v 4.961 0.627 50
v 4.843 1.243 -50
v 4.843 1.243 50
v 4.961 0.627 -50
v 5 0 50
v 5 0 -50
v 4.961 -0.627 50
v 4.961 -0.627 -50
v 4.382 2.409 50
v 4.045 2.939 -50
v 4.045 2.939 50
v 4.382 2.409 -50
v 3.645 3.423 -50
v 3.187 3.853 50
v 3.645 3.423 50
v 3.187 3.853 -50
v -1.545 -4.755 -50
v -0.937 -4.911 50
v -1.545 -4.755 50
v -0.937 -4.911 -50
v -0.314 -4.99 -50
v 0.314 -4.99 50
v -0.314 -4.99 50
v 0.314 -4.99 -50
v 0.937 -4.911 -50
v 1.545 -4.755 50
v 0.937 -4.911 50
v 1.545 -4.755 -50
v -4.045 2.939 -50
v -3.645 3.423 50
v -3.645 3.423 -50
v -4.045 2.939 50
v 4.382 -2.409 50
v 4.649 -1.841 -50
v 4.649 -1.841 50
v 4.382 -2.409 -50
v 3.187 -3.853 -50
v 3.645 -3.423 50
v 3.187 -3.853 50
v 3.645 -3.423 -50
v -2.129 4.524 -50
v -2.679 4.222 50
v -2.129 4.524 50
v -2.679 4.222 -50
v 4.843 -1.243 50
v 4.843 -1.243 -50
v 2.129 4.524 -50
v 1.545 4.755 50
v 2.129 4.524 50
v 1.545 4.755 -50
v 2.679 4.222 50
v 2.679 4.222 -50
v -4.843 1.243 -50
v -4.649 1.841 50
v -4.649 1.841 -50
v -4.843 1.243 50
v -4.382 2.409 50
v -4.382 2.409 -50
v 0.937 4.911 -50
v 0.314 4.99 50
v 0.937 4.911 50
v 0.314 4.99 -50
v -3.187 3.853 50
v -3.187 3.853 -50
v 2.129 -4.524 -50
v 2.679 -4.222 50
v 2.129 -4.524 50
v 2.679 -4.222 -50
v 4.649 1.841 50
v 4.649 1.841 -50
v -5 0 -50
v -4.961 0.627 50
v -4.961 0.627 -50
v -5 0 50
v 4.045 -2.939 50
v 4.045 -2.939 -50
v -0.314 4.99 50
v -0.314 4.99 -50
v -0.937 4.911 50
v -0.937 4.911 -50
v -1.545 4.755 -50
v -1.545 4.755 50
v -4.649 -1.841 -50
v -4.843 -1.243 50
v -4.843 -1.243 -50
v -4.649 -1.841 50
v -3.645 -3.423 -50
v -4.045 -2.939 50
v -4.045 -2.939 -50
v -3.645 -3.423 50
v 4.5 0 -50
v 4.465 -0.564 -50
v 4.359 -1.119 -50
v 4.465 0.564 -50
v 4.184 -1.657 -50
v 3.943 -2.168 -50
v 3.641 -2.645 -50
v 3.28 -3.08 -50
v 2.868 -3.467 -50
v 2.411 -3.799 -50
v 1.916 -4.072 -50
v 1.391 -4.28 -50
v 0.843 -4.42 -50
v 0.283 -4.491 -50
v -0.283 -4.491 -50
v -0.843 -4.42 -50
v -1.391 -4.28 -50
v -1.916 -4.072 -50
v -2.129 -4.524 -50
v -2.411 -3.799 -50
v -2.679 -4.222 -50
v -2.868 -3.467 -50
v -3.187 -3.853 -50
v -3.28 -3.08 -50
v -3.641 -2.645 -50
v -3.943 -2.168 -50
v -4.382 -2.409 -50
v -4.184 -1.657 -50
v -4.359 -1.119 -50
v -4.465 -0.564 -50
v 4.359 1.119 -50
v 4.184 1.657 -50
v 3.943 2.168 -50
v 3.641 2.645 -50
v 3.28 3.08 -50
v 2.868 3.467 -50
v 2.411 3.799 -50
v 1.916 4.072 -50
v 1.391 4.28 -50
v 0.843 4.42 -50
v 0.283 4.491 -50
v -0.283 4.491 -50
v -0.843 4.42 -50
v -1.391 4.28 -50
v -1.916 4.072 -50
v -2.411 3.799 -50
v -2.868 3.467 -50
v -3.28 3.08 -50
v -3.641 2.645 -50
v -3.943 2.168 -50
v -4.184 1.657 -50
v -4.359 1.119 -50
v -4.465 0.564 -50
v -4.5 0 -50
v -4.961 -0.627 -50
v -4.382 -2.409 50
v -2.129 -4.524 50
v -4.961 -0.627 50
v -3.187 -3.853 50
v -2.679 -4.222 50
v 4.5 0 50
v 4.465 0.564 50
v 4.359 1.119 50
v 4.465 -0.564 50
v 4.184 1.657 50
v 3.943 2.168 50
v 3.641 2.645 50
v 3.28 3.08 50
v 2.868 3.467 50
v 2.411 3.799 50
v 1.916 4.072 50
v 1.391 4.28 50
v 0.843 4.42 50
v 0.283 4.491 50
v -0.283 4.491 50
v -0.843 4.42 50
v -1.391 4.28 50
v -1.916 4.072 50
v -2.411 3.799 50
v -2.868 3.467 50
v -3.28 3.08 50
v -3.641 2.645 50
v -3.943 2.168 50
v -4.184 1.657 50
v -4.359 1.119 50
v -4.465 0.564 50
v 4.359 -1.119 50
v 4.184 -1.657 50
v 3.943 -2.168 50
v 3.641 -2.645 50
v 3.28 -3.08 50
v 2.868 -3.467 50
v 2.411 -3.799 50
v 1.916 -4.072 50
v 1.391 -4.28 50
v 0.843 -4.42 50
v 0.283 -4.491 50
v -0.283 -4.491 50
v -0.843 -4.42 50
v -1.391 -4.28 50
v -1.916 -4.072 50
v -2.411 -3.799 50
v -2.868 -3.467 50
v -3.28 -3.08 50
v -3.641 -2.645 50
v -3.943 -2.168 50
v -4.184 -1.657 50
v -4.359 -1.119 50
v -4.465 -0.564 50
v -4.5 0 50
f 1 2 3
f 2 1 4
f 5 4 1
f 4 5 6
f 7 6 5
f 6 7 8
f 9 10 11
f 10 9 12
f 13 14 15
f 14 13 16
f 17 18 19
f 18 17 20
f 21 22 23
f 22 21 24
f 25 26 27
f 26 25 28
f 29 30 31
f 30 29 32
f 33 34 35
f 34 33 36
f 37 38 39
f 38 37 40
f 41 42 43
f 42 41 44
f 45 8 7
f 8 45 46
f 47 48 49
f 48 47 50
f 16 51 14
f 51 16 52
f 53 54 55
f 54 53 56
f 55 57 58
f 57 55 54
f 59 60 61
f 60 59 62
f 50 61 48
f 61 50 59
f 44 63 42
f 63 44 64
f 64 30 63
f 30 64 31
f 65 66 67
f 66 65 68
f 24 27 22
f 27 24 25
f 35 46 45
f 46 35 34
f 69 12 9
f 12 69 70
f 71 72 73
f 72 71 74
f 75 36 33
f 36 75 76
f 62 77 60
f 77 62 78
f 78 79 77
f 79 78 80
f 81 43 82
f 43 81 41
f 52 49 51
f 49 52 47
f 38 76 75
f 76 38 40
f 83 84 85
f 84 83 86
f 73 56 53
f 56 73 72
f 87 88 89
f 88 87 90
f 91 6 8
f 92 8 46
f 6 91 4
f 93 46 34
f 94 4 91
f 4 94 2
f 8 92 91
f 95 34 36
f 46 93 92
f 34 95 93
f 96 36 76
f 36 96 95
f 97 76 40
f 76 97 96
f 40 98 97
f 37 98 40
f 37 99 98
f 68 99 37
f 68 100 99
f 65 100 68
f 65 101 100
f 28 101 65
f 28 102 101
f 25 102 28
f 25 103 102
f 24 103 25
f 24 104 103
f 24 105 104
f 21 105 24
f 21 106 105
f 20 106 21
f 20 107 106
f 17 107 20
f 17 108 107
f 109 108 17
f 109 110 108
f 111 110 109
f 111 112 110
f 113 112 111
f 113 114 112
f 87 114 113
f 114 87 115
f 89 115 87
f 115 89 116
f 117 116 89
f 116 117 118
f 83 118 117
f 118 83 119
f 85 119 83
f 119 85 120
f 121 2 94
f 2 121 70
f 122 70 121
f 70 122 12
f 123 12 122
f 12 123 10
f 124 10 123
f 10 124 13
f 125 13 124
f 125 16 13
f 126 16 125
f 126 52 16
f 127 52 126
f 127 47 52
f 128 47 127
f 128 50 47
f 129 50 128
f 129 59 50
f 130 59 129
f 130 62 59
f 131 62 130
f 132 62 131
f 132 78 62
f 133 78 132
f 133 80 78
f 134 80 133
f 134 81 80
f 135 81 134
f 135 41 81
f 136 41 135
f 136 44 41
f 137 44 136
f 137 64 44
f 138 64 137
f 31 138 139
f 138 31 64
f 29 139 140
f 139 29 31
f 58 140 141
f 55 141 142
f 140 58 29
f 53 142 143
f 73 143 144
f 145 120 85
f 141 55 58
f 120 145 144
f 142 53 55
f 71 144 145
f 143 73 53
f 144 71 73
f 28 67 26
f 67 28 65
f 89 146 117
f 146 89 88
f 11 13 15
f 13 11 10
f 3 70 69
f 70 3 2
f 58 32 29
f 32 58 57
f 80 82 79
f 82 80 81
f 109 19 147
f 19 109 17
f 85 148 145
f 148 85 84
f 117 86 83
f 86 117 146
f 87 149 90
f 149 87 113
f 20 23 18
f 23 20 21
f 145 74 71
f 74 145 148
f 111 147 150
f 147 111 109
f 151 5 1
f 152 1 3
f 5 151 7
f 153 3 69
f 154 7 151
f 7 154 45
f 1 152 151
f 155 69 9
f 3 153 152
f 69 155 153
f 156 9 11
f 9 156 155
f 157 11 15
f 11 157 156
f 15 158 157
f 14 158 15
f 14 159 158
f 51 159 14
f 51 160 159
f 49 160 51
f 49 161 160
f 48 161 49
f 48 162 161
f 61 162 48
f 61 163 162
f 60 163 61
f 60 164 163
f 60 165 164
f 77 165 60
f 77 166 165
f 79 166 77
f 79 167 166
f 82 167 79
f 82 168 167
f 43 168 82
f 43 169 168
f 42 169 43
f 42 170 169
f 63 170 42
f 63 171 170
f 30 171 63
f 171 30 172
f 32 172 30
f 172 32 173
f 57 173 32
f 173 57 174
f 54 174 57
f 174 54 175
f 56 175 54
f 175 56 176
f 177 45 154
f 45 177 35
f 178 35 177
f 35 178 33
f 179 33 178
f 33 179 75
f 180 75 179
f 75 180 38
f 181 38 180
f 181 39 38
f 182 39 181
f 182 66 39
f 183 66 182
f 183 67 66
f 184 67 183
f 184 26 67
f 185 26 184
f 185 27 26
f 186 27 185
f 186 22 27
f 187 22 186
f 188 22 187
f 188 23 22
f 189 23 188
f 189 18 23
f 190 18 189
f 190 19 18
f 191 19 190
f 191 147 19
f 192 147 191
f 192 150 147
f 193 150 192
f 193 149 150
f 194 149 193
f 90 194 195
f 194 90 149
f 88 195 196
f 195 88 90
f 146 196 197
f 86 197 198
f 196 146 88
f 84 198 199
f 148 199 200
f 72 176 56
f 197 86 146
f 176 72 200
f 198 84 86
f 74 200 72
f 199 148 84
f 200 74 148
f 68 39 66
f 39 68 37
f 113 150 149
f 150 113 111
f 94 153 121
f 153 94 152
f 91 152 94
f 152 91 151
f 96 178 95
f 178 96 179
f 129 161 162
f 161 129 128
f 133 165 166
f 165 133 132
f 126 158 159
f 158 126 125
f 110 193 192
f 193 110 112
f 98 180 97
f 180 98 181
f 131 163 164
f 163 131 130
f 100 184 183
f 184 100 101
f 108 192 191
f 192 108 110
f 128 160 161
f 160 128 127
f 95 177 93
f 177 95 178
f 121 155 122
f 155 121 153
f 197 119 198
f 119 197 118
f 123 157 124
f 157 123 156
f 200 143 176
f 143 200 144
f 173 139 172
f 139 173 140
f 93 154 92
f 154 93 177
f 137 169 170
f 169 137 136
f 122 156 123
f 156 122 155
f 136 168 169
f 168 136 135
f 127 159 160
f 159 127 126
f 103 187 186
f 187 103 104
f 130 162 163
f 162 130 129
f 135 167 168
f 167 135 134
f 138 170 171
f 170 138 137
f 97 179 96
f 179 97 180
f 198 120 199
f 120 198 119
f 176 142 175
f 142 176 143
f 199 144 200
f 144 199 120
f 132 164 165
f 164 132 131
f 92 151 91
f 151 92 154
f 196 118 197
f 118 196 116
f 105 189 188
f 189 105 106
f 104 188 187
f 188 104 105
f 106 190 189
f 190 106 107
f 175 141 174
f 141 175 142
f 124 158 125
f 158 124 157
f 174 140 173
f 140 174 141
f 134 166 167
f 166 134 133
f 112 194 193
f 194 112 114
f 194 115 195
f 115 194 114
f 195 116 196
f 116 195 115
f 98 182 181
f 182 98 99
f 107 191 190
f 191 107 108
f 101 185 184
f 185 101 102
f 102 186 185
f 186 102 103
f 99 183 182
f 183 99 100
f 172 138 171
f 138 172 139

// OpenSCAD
$fn = 50;


difference() {
	union() {
		translate(v = [0, 0, -50.0000000000]) {
			cylinder(h = 100, r = 5.0000000000);
		}
	}
	union() {
		translate(v = [0, 0, -100.0000000000]) {
			cylinder(h = 200, r = 4.5000000000);
		}
	}
}
